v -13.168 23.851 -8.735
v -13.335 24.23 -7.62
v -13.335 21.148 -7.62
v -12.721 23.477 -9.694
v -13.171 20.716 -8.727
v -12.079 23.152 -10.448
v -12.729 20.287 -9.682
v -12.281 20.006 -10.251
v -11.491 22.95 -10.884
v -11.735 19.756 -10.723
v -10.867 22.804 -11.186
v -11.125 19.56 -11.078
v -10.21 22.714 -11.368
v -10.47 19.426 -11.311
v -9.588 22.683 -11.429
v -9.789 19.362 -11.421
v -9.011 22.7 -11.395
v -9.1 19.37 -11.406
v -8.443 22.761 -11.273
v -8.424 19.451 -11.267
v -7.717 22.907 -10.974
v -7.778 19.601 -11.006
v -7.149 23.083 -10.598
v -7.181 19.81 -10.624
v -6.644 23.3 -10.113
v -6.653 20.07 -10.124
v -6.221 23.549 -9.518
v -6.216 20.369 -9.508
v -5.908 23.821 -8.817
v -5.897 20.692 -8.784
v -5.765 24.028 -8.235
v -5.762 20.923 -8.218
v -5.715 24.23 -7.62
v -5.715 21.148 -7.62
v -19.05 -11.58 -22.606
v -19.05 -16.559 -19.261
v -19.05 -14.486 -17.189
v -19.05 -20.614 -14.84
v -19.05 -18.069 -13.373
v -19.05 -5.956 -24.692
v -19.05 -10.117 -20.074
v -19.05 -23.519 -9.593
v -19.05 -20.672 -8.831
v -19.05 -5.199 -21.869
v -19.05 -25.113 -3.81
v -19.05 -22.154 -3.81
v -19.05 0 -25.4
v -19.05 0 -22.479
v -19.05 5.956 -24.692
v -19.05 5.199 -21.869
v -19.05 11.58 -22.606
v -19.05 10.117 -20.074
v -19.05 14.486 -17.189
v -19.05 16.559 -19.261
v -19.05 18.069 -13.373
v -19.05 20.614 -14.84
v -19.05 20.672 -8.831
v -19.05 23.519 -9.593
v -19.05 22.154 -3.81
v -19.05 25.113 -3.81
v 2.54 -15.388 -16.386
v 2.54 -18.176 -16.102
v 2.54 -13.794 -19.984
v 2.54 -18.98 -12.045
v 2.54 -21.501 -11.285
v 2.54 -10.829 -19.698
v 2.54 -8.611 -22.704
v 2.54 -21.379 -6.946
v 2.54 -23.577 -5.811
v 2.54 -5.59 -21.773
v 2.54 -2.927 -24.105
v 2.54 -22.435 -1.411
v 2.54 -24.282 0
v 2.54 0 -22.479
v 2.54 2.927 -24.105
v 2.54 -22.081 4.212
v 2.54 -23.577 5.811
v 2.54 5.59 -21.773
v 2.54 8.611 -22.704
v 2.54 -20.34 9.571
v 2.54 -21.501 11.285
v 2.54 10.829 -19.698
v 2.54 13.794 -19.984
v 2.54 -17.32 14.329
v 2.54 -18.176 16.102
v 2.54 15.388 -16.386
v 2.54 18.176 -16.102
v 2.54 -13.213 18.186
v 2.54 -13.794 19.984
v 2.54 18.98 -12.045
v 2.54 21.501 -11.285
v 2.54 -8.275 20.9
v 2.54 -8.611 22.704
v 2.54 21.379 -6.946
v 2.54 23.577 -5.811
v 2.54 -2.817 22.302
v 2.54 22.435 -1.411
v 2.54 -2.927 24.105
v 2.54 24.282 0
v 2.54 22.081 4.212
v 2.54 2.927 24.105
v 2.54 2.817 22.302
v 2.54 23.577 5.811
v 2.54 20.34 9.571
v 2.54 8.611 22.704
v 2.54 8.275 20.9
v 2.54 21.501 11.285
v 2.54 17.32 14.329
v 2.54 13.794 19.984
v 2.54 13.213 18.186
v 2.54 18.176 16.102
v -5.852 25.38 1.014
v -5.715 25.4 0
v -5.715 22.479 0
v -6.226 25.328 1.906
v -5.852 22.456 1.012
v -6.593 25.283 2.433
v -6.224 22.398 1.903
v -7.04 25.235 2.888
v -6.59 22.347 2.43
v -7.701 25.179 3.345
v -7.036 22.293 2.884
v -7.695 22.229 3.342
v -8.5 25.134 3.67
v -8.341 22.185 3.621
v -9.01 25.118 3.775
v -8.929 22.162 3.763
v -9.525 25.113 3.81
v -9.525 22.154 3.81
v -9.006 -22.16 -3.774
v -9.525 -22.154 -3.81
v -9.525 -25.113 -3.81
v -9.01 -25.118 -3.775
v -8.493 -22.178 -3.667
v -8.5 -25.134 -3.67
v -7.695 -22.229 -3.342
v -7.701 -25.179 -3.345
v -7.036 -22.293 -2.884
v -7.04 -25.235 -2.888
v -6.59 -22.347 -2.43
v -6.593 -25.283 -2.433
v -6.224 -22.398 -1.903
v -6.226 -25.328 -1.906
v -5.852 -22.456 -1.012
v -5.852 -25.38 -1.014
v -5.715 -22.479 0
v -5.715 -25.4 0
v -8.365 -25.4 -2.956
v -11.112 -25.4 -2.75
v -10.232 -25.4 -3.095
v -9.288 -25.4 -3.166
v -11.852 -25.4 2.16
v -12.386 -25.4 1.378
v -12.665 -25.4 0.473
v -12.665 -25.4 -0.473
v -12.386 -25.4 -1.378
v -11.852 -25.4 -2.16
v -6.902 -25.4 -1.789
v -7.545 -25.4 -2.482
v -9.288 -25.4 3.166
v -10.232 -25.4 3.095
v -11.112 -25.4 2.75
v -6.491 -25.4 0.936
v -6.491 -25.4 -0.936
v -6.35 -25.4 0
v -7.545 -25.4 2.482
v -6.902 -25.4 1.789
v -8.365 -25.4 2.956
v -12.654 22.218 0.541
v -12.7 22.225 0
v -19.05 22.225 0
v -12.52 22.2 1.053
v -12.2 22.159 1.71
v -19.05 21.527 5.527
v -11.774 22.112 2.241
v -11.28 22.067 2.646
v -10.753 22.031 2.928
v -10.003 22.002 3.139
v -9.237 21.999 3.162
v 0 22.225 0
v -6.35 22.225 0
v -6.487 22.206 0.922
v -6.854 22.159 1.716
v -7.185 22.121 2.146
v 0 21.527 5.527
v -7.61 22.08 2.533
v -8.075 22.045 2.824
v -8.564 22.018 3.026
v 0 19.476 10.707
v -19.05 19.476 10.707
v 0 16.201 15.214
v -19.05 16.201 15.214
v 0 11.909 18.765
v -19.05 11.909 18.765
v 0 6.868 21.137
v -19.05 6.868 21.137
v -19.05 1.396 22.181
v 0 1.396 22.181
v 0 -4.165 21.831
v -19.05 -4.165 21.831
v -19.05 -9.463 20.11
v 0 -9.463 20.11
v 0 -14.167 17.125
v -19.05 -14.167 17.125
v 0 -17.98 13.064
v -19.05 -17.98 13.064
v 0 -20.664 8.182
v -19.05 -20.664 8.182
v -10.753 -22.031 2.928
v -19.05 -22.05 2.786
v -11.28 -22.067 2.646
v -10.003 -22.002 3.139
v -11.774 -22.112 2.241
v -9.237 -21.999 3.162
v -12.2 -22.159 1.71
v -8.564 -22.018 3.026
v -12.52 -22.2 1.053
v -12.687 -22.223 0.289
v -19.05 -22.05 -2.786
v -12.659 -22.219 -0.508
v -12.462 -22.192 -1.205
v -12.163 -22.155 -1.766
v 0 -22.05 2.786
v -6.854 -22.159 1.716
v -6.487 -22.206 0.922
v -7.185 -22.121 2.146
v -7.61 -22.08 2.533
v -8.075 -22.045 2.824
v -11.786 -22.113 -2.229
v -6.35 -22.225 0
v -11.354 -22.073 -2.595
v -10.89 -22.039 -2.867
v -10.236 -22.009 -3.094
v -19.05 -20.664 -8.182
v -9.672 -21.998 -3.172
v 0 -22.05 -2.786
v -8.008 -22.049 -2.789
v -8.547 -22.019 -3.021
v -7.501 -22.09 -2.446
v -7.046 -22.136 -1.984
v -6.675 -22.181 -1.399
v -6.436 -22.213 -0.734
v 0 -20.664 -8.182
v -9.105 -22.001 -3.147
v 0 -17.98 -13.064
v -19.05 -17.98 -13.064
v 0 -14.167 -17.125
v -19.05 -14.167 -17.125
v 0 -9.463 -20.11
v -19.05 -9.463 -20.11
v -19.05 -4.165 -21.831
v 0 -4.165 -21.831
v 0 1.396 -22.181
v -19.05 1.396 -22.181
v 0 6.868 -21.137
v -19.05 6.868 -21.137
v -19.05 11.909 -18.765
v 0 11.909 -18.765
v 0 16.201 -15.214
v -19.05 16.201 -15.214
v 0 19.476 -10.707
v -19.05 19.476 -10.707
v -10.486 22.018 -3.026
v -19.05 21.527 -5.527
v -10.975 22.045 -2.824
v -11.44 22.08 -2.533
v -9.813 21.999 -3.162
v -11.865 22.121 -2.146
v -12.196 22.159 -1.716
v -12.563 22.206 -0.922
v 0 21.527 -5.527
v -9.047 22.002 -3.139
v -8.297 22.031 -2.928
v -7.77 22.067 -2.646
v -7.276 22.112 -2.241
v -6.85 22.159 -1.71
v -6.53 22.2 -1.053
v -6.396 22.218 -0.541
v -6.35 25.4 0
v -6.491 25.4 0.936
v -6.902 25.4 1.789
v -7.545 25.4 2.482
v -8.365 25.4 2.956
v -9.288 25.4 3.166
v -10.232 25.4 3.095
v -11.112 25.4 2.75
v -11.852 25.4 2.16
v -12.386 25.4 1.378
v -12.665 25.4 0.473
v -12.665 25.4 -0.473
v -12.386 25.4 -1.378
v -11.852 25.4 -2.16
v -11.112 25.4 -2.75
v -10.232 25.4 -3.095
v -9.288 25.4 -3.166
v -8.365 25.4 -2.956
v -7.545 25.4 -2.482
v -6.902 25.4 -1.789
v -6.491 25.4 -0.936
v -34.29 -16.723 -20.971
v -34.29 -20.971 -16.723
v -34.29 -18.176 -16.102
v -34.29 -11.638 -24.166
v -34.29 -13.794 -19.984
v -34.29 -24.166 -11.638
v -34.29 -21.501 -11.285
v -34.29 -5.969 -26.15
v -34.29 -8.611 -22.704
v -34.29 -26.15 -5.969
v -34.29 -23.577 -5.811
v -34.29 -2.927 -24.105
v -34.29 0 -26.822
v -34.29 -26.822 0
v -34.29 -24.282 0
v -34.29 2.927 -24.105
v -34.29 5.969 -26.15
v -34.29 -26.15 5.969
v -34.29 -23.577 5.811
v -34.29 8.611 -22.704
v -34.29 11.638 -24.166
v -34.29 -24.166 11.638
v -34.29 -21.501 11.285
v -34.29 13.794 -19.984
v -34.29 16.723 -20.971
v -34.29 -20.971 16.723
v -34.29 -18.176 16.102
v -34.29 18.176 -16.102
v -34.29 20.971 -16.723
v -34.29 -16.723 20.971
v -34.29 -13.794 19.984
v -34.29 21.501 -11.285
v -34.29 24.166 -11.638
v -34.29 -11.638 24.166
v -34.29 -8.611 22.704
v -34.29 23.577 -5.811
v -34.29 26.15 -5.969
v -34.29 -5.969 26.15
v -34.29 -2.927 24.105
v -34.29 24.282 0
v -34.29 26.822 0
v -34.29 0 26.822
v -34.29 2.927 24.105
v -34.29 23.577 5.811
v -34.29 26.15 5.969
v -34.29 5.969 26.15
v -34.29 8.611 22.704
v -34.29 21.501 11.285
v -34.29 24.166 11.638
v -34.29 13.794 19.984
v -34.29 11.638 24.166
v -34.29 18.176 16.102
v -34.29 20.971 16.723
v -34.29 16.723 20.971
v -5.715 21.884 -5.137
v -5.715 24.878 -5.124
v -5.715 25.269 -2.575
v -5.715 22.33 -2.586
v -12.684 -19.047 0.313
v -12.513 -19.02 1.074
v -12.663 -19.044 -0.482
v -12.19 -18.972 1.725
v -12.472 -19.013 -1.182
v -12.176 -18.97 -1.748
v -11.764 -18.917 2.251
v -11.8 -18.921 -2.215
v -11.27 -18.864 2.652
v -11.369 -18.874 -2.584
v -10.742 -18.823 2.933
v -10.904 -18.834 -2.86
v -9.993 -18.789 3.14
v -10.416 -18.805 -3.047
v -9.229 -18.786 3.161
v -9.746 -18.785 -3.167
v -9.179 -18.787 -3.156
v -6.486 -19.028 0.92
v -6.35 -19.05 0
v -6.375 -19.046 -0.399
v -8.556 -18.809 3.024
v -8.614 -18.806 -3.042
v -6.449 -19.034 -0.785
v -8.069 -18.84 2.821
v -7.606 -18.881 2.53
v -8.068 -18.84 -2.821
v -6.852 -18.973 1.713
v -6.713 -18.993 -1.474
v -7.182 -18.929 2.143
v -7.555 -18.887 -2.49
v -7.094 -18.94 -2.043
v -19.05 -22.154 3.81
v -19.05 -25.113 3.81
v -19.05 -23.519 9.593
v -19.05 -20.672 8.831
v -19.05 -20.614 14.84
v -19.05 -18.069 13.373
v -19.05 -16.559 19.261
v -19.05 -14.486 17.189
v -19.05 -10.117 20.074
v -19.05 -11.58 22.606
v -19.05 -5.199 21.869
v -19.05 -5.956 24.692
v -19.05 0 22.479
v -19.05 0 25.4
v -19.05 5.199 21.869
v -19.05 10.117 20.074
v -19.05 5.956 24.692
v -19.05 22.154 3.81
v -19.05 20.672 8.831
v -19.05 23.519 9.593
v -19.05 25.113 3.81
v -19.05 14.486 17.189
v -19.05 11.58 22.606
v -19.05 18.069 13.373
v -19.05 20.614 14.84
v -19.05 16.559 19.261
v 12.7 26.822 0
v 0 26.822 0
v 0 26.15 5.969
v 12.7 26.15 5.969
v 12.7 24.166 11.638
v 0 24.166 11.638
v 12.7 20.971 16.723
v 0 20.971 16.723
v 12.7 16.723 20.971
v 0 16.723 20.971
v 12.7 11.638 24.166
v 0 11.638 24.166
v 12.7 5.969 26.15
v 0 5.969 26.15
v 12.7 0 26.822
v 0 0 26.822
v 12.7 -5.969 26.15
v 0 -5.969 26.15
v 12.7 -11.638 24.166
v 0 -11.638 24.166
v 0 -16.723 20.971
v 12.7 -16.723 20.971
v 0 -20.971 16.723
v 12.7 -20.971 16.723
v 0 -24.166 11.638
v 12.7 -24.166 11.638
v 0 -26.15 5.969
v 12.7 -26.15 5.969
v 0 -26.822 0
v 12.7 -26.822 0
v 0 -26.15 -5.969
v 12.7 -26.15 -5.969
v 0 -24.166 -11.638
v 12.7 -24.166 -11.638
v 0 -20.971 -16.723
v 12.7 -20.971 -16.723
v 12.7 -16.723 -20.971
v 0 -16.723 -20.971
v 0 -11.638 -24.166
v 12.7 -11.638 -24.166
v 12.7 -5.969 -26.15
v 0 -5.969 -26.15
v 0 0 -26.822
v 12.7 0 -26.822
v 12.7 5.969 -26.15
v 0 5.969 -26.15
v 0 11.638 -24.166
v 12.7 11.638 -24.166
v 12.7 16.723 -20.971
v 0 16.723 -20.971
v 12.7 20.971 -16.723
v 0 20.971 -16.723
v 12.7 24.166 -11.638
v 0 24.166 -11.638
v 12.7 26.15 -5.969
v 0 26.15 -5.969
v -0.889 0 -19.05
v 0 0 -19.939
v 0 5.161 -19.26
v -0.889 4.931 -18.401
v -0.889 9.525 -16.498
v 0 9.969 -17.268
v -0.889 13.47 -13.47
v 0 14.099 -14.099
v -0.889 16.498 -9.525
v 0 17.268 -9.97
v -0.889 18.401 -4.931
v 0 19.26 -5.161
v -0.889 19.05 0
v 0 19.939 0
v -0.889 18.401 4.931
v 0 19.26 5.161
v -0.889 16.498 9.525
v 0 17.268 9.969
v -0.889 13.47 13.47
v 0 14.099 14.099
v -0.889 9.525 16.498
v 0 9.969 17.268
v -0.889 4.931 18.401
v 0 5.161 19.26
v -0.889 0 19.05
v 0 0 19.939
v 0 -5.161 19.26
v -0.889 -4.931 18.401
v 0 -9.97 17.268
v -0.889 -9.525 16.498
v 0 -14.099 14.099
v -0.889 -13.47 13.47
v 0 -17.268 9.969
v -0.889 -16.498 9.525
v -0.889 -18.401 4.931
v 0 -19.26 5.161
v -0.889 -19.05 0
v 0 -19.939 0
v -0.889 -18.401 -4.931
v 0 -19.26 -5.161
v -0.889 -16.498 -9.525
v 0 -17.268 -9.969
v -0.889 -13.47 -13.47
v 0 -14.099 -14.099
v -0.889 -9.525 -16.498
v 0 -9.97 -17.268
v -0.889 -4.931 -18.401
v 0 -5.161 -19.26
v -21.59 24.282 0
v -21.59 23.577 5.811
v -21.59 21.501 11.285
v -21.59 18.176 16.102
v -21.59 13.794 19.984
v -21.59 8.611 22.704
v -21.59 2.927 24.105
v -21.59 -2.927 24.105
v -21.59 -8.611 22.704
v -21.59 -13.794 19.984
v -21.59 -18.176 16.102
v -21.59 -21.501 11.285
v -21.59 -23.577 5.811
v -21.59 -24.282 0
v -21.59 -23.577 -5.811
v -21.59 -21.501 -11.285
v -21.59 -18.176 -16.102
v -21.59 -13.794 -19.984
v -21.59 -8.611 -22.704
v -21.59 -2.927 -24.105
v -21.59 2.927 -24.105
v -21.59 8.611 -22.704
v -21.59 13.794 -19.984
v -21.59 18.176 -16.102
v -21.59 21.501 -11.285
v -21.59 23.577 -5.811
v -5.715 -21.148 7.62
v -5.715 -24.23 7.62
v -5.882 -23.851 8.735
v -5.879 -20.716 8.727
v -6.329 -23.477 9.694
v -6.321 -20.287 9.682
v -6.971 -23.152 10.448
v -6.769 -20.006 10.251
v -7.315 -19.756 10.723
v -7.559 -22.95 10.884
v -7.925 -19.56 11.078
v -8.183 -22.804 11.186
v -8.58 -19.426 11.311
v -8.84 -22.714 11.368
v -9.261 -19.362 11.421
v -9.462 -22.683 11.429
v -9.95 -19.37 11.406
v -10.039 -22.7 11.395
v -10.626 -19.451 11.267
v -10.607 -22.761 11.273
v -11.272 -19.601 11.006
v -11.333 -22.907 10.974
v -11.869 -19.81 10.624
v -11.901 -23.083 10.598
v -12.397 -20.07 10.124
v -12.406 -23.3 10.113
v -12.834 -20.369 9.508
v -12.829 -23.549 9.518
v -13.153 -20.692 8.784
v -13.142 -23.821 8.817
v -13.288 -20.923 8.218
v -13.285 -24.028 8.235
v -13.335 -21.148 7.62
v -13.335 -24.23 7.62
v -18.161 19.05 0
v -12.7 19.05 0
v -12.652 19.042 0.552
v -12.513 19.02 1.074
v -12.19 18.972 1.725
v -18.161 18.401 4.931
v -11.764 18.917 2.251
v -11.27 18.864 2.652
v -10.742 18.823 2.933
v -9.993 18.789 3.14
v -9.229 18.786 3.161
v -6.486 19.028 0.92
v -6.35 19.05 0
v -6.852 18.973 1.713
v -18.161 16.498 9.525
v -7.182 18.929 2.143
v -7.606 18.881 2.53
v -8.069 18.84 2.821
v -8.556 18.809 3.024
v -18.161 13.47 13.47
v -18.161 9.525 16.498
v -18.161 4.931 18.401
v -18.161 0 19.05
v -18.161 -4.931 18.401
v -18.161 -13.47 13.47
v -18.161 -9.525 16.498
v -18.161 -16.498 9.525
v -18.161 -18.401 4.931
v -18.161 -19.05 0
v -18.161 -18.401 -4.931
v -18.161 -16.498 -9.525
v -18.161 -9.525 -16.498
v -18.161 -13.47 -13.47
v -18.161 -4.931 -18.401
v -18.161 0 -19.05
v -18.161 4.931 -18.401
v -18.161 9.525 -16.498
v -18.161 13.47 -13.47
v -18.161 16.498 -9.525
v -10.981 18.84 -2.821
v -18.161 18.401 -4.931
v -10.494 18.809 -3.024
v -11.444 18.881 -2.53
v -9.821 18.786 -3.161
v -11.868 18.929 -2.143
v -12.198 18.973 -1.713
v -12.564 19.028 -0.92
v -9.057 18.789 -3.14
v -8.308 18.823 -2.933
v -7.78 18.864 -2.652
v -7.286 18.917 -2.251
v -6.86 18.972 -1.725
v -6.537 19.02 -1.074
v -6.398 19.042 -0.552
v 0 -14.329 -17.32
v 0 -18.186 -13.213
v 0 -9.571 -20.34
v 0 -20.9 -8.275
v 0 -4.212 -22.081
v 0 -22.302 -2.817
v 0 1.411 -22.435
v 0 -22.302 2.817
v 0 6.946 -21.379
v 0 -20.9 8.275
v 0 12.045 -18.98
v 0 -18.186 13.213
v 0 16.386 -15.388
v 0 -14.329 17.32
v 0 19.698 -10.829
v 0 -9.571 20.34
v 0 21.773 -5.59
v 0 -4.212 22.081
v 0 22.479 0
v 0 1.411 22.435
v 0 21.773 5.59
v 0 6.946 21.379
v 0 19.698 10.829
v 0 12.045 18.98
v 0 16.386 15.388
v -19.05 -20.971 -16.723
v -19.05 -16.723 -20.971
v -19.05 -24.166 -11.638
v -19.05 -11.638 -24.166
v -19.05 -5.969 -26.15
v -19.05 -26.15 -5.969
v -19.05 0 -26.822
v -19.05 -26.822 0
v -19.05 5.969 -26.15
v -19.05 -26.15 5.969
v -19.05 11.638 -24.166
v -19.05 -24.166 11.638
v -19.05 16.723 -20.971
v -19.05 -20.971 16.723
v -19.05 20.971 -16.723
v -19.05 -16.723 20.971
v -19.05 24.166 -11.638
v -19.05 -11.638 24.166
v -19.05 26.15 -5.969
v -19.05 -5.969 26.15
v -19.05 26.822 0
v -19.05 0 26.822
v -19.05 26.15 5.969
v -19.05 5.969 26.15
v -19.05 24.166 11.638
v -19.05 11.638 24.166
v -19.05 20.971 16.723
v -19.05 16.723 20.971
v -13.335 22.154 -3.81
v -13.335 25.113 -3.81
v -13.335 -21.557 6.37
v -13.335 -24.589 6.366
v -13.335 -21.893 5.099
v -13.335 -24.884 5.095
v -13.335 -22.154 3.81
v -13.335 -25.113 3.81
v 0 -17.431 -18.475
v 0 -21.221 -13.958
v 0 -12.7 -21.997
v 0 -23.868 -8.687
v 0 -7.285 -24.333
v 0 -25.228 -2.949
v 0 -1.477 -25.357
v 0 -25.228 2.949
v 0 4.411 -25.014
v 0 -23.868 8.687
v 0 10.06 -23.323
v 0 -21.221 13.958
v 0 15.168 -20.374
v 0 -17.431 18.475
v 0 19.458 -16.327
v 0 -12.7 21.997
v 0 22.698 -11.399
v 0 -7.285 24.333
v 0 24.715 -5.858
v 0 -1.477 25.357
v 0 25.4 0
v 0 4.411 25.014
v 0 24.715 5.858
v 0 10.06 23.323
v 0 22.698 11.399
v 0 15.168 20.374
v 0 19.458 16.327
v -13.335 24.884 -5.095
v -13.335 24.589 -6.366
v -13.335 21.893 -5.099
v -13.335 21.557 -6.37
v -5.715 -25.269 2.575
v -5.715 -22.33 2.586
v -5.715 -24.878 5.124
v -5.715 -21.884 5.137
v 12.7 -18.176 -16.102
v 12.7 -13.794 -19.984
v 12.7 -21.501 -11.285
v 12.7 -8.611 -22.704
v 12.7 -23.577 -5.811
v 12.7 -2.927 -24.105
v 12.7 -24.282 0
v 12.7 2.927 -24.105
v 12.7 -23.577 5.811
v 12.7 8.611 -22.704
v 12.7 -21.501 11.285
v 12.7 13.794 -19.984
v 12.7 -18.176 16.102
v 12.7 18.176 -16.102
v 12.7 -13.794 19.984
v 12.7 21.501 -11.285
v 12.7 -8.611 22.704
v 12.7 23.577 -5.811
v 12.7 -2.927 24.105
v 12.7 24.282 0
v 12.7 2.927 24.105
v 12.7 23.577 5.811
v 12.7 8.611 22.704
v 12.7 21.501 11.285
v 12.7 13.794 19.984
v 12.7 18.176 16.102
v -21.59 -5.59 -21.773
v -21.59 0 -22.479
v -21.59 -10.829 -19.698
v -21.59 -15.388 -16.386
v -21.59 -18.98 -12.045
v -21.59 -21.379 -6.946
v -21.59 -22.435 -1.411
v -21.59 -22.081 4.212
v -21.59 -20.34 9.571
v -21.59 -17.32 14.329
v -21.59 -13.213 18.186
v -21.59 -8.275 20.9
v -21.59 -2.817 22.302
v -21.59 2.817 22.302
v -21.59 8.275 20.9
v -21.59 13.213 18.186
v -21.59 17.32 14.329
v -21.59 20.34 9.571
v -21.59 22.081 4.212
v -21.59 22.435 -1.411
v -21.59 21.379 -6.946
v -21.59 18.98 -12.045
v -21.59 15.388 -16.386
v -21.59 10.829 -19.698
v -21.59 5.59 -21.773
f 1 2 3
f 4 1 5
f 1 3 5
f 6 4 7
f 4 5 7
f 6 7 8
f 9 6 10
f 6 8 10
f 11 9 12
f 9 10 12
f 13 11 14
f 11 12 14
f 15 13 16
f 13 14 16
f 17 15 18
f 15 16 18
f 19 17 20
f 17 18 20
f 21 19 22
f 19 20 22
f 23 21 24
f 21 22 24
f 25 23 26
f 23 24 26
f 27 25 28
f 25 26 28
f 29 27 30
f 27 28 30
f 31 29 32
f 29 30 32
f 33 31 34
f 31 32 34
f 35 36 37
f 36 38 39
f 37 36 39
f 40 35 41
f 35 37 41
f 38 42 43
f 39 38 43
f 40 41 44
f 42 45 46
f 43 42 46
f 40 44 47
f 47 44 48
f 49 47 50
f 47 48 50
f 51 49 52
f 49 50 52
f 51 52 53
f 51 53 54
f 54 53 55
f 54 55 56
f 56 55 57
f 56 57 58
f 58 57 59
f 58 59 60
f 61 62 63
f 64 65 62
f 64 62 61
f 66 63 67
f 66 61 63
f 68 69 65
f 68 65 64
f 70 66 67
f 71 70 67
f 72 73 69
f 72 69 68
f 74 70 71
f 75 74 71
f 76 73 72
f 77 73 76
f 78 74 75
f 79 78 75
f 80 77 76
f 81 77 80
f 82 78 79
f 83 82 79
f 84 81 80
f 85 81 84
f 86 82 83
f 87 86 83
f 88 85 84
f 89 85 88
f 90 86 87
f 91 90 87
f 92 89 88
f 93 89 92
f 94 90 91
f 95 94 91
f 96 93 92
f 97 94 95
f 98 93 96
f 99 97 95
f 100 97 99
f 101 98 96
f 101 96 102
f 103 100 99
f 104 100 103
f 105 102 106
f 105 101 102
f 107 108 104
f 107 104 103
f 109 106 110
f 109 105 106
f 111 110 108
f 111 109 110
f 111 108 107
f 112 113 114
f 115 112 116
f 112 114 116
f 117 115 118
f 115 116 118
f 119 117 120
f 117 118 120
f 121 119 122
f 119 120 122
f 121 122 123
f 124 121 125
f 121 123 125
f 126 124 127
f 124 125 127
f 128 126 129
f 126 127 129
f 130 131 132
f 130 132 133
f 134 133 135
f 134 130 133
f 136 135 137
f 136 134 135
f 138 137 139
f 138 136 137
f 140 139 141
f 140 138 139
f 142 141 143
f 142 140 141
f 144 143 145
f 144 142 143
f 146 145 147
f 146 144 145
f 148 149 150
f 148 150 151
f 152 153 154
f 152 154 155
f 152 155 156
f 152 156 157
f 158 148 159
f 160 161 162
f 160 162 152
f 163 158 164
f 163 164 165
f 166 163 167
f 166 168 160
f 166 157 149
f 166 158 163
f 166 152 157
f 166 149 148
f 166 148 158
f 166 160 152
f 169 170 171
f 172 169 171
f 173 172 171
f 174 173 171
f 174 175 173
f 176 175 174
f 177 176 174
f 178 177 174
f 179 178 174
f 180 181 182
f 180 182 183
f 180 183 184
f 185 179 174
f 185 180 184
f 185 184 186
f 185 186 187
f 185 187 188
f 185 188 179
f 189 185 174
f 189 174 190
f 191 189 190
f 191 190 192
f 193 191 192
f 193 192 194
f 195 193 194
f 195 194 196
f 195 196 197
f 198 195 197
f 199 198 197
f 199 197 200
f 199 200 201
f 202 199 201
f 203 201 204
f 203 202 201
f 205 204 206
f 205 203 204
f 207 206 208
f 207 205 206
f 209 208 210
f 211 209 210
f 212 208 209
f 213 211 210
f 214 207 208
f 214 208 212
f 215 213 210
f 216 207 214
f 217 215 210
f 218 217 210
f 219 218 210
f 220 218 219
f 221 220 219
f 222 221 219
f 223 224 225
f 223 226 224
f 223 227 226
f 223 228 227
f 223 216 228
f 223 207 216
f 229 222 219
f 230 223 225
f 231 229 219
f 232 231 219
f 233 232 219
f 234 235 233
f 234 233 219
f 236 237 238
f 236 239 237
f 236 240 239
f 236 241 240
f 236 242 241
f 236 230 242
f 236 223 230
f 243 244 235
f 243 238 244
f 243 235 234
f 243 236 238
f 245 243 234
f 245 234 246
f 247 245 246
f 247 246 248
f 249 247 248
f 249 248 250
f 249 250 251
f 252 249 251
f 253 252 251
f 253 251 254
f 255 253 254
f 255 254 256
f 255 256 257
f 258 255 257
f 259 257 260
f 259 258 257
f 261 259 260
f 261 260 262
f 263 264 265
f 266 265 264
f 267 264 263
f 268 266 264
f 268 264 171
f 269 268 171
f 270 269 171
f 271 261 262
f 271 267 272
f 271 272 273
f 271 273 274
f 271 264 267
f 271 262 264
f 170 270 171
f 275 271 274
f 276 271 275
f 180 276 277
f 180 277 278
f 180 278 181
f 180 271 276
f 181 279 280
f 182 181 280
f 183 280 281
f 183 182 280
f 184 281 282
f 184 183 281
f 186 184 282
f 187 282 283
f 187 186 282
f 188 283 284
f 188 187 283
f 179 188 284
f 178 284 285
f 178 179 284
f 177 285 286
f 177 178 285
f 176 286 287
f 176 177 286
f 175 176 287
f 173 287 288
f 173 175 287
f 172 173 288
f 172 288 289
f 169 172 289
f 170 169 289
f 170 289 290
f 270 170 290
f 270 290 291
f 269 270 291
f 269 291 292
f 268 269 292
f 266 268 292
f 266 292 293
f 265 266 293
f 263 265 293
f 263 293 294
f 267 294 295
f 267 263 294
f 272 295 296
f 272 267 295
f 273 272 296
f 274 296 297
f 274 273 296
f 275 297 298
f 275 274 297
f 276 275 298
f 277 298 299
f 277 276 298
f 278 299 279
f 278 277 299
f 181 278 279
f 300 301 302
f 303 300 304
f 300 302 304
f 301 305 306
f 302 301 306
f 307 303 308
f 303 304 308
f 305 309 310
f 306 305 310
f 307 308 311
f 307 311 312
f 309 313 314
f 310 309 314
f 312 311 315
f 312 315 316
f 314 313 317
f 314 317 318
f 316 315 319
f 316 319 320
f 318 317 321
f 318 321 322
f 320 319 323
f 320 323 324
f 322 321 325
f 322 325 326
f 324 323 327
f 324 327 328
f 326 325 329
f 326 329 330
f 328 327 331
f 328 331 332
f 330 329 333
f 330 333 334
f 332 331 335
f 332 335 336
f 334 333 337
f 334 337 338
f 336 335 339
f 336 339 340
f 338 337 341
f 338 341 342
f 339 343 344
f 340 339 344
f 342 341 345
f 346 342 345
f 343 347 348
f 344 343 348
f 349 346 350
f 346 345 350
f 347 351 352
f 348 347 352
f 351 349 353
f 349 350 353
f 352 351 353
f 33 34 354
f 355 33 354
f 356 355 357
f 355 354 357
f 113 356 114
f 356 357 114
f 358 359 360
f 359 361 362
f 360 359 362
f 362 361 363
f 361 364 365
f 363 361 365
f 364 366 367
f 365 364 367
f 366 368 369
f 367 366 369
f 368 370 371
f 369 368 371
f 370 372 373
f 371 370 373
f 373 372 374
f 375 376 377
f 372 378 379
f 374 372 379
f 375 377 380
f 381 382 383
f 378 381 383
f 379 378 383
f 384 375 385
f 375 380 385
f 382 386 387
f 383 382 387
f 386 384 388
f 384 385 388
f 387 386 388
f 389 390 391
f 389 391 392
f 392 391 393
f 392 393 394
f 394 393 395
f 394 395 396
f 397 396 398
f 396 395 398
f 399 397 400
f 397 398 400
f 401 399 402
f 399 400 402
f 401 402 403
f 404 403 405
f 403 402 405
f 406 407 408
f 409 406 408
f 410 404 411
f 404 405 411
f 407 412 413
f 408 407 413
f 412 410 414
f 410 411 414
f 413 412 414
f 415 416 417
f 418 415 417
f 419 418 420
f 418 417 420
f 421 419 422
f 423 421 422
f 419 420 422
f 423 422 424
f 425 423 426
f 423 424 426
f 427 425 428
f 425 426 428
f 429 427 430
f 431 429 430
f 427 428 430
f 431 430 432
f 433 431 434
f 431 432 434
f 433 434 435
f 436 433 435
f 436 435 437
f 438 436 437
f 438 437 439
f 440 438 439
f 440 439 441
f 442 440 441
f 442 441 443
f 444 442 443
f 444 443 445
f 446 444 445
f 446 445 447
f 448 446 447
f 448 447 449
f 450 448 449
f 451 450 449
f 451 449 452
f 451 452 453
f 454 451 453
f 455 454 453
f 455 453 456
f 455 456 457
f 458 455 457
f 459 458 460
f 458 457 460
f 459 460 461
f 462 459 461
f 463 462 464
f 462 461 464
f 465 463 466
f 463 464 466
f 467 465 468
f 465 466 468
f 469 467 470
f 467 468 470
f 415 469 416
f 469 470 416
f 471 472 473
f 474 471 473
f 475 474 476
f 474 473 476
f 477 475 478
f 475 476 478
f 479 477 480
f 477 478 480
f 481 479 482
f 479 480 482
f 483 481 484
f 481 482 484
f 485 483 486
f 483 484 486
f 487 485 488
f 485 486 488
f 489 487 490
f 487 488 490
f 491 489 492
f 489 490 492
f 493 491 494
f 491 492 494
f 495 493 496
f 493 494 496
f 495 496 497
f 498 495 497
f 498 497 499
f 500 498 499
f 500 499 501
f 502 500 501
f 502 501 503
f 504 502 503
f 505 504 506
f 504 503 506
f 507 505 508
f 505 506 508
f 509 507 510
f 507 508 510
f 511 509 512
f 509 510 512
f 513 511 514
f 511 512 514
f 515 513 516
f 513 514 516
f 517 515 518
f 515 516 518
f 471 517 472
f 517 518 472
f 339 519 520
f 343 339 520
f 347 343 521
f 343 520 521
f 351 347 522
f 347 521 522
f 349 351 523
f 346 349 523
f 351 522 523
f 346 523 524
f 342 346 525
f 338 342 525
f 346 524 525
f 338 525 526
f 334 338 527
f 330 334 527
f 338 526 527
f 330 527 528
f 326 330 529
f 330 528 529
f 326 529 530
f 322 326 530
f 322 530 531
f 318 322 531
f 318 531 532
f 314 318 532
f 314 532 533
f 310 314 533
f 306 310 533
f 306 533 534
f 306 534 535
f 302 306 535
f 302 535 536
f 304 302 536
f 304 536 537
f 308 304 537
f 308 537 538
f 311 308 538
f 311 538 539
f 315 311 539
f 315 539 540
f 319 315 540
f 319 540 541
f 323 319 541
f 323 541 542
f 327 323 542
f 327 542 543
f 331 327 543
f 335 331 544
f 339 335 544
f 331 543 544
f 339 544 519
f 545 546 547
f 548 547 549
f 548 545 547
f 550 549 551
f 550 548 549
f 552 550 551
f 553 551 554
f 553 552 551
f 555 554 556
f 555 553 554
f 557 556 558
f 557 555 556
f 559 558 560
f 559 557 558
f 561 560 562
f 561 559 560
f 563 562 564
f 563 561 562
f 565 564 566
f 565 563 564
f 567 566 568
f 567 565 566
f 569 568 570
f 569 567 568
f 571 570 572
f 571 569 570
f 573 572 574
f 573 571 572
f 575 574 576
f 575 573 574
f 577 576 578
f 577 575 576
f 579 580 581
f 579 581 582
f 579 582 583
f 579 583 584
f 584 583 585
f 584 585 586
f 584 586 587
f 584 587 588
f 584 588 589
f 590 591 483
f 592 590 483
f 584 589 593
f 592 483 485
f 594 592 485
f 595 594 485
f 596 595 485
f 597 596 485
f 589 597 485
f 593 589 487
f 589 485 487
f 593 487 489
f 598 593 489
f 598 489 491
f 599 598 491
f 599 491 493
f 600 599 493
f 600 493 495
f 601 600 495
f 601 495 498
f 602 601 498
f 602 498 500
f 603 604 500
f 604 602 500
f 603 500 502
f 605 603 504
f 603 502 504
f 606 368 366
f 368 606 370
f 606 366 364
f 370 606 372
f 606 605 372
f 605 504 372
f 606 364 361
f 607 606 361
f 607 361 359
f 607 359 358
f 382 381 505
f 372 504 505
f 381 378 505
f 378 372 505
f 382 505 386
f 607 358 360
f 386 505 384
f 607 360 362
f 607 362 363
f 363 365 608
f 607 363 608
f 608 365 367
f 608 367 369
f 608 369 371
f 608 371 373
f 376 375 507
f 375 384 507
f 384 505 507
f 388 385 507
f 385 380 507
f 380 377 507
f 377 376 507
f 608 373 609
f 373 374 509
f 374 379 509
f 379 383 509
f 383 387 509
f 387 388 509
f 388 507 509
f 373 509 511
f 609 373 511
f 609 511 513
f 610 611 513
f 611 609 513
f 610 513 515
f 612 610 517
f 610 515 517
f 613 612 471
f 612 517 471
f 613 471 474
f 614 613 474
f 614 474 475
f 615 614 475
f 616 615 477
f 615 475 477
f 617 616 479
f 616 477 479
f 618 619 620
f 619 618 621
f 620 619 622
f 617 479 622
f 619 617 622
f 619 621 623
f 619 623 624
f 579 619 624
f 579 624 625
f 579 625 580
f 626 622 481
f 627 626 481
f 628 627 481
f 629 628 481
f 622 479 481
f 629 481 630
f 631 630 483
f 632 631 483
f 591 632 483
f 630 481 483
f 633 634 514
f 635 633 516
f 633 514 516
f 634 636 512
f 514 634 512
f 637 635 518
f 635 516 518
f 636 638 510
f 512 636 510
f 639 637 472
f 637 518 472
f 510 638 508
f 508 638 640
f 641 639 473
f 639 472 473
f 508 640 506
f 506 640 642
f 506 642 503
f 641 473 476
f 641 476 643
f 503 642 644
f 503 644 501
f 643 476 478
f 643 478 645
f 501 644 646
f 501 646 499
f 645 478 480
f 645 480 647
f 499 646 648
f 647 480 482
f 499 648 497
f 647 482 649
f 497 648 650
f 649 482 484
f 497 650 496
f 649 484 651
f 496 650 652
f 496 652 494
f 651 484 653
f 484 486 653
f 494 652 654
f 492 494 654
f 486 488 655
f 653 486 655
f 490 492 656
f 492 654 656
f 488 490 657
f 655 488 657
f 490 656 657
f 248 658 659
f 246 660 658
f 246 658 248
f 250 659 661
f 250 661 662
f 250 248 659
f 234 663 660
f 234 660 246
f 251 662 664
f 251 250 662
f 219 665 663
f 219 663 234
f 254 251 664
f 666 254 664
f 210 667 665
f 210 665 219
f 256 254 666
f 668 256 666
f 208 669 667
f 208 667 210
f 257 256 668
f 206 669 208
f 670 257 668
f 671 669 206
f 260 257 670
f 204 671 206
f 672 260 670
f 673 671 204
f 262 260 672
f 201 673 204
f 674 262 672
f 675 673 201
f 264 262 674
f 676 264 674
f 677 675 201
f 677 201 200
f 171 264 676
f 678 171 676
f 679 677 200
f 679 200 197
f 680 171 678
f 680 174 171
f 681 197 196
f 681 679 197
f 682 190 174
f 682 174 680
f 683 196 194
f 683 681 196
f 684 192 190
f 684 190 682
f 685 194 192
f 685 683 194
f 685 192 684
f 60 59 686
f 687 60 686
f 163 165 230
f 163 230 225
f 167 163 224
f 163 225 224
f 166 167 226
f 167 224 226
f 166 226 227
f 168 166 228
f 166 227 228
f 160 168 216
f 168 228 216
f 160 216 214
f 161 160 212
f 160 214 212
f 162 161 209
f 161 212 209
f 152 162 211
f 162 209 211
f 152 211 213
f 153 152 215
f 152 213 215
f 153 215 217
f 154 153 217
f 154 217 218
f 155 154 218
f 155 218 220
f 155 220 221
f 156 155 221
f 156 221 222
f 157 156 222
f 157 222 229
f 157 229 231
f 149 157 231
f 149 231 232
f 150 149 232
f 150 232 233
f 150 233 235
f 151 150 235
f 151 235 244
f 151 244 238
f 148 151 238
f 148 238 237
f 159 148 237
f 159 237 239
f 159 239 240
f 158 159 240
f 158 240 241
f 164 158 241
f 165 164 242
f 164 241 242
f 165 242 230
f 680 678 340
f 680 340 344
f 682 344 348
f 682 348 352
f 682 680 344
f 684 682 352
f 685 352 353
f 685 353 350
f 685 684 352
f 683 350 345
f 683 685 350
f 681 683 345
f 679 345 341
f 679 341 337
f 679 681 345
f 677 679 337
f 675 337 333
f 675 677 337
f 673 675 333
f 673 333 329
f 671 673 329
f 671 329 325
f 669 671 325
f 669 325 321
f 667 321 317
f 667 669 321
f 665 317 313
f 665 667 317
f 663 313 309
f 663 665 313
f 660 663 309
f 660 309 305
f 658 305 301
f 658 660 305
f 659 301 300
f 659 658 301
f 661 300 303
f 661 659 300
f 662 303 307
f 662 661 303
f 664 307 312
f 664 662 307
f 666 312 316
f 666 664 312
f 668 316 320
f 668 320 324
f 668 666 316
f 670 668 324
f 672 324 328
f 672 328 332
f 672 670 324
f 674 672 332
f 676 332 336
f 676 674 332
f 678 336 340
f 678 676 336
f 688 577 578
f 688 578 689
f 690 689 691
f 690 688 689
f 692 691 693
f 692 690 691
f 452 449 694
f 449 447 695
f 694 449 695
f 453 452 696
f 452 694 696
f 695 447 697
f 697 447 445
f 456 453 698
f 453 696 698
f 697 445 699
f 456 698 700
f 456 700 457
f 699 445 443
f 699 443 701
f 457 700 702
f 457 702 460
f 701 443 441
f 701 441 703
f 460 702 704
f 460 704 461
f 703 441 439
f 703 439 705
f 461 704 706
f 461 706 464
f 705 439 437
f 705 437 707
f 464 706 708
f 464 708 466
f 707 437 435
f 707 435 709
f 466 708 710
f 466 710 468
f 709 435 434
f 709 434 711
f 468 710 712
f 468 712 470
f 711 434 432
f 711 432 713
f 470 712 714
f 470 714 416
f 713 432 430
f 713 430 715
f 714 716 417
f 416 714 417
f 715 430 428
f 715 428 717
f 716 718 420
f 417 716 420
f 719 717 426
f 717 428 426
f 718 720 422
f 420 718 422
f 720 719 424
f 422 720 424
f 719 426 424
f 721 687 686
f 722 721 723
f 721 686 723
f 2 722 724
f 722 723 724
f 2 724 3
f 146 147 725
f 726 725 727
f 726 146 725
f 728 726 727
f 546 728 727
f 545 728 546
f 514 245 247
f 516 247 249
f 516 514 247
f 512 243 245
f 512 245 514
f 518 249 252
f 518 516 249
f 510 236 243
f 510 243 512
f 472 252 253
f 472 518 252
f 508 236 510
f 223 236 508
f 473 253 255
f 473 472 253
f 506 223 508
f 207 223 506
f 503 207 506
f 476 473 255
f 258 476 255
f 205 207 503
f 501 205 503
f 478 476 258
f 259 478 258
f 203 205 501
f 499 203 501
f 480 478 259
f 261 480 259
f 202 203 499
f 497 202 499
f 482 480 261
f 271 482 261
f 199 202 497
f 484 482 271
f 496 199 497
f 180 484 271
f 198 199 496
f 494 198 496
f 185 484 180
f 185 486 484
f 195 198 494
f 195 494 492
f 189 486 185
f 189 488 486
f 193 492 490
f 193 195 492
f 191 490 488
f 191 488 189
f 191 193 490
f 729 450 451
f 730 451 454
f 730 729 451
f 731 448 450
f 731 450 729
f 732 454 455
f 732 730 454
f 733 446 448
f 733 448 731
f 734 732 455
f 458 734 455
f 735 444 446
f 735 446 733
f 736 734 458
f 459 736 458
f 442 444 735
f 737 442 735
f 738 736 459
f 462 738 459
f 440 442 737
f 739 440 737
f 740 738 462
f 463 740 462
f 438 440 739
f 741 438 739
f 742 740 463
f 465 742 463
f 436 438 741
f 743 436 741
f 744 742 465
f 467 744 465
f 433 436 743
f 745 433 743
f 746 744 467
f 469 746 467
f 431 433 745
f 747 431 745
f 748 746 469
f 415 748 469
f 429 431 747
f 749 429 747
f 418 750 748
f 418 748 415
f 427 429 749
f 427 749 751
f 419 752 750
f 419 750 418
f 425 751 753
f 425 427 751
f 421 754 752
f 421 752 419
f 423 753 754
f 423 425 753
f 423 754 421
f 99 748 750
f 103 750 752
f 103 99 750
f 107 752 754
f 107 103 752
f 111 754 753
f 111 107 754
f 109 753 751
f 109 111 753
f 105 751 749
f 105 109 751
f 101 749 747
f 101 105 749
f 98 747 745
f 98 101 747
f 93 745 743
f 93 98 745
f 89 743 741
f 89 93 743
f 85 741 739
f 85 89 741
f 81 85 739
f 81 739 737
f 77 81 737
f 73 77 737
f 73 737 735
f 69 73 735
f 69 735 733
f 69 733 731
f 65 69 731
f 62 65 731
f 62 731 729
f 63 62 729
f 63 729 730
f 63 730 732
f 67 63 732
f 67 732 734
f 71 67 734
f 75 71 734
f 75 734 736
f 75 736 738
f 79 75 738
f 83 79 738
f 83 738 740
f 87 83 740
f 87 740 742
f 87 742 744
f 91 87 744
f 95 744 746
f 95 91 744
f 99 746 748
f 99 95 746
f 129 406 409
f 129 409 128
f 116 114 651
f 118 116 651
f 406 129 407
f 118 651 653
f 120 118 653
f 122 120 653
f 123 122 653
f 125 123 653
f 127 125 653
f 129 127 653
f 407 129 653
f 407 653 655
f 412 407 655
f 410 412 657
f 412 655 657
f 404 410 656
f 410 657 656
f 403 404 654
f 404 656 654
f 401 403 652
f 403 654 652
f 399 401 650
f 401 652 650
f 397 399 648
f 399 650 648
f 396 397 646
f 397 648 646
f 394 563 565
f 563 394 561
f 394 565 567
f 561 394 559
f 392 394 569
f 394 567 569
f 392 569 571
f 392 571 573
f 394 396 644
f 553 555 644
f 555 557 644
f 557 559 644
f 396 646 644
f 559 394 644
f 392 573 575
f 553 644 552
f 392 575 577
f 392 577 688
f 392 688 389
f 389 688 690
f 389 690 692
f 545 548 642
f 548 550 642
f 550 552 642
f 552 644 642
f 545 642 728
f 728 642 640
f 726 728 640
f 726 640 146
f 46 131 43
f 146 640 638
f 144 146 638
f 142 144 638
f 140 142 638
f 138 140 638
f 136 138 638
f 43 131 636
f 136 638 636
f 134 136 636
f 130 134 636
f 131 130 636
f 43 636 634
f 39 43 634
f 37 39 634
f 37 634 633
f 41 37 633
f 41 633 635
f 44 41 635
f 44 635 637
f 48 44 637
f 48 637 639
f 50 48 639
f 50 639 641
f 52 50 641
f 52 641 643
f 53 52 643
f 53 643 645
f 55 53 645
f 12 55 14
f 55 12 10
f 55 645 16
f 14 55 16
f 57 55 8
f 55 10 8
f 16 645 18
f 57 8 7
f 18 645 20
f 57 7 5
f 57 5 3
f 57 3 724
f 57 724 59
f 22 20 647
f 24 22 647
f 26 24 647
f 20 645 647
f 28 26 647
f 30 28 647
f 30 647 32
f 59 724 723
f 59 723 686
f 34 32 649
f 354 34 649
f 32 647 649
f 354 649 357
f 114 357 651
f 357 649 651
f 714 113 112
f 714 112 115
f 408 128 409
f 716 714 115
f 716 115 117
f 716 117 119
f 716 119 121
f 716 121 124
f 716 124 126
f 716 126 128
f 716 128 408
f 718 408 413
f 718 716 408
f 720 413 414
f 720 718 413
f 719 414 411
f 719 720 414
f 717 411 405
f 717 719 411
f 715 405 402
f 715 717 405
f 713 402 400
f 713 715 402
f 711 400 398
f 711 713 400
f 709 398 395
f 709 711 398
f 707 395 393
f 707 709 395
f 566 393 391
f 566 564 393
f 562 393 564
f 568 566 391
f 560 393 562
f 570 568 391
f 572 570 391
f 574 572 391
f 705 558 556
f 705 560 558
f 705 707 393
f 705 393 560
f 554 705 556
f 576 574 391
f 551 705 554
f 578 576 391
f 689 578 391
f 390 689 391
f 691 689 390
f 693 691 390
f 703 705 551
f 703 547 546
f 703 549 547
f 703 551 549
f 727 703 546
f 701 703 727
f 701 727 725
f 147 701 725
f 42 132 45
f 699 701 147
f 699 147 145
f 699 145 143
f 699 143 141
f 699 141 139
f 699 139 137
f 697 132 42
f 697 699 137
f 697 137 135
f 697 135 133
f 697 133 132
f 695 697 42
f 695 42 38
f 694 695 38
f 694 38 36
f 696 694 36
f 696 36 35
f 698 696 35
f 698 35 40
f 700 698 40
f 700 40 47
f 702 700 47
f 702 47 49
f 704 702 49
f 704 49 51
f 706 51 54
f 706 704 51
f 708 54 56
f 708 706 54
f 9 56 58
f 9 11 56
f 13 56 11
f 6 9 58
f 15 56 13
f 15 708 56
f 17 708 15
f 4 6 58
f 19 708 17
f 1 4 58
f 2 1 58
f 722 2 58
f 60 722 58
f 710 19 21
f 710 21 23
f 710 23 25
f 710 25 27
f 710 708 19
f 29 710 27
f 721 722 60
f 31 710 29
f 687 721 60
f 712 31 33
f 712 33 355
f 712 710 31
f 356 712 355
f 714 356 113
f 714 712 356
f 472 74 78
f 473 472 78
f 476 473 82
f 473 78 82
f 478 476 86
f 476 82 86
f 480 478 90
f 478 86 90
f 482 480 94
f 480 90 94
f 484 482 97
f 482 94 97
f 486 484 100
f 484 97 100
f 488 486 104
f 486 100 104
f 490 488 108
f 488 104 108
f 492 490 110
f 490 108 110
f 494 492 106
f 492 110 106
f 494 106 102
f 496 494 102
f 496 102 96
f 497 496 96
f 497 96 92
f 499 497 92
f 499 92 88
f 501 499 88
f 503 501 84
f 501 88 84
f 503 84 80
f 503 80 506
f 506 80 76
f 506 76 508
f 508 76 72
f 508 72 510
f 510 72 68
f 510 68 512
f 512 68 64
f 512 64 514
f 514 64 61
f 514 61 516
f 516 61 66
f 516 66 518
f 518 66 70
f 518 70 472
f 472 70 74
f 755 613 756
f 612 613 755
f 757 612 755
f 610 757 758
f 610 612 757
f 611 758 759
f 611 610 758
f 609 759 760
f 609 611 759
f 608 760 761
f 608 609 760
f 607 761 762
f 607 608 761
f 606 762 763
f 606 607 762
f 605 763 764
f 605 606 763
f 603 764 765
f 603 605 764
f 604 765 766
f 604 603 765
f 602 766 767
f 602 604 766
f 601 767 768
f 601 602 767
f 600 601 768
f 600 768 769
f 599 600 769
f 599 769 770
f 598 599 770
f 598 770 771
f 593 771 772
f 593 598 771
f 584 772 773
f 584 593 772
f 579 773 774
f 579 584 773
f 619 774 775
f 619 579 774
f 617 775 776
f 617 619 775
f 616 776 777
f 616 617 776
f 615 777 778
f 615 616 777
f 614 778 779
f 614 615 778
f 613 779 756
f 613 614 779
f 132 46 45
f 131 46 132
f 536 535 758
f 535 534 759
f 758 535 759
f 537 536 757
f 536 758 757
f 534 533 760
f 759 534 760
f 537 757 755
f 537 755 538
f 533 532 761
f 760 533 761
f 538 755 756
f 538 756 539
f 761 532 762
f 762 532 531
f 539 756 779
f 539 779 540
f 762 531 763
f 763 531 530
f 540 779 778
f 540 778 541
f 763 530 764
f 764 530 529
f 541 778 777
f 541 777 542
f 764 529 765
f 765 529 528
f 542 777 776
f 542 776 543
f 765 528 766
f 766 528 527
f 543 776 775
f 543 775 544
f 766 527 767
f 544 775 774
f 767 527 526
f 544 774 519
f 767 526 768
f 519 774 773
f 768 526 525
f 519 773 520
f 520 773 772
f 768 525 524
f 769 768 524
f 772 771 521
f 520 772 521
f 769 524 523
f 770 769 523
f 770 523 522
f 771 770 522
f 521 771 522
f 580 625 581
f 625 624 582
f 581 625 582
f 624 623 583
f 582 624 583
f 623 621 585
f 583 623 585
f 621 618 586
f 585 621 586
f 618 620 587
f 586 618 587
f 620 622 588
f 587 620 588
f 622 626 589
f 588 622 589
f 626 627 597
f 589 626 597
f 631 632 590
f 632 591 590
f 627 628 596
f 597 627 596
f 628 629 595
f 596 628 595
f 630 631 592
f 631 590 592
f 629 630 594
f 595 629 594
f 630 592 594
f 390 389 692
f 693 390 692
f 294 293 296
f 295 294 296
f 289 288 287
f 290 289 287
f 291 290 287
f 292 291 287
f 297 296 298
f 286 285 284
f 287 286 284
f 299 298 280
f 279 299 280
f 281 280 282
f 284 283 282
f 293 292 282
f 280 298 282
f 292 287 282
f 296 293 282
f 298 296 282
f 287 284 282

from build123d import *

# Parameters (mm, degrees)
F0_R           = 26.8224
F0_R_2         = 24.2824
F0_R_3         = 19.05
F1_DEPTH       = 2.54
F2_DEPTH       = 12.7
F3_R           = 25.4
F3_R_2         = 22.479
F4_DEPTH       = 19.05
F5_W           = 9.525
F5_H           = 7.62
F6_DEPTH       = 50.8
F6_DEPTH_BACK  = 50.8
F7_R           = 3.81
F8_DEPTH       = 50.8
F8_DEPTH_BACK  = 50.8
F10_DEPTH      = 50.8
F12_DEPTH      = 25.4
F13_R          = 22.225
F13_R_2        = 19.05
F14_DEPTH      = 21.59
F15_START      = -19.05
F13_R_3        = 24.2824
F15_DEPTH      = 2.54
F17_START      = -19.05
F16_R          = 26.8224
F16_R_2        = 24.2824
F17_DEPTH      = 15.24
F18_R          = 3.175
F19_DEPTH      = 25.4
F19_DEPTH_BACK = 25.4
F20_DEPTH      = 25.4
F21_W          = 2.54
F21_H          = 0.889


with BuildPart() as f1:
    # F0 (on Right) → F1 (new body)
    with BuildSketch(Plane.YZ):
        Circle(F0_R)
        Circle(F0_R_2, mode=Mode.SUBTRACT)
        Circle(F0_R_2)
        Circle(F0_R_3, mode=Mode.SUBTRACT)
    extrude(amount=F1_DEPTH)

    # F0 (on Right) → F2 (join)
    with BuildSketch(Plane.YZ):
        Circle(F0_R)
        Circle(F0_R_2, mode=Mode.SUBTRACT)
    extrude(amount=F2_DEPTH)

    # F3 (on Right) → F4 (join)
    with BuildSketch(Plane.YZ):
        Circle(F3_R)
        Circle(F3_R_2, mode=Mode.SUBTRACT)
    extrude(amount=-F4_DEPTH)

    # F5 (on Front) → F6 (cut, two sides)
    with BuildSketch(Plane.XZ) as f6_sk:
        with Locations((-14.2875, 0)):
            Rectangle(F5_W, F5_H)
    extrude(amount=-F6_DEPTH, mode=Mode.SUBTRACT)
    extrude(f6_sk.sketch, amount=F6_DEPTH_BACK, mode=Mode.SUBTRACT)

    # F7 (on Front) → F8 (cut, two sides)
    with BuildSketch(Plane.XZ) as f8_sk:
        with Locations((-9.525, 0)):
            Circle(F7_R)
    extrude(amount=-F8_DEPTH, mode=Mode.SUBTRACT)
    extrude(f8_sk.sketch, amount=F8_DEPTH_BACK, mode=Mode.SUBTRACT)

    # F9 (on Front) → F10 (cut)
    with BuildSketch(Plane.XZ):
        with BuildLine():
            ThreePointArc((-13.335, 7.62), (-9.525, 3.81), (-5.715, 7.62))
            ThreePointArc((-5.715, 7.62), (-9.525, 11.43), (-13.335, 7.62))
        make_face()
        with BuildLine():
            Line((-5.715, 0), (-5.715, 7.62))
            ThreePointArc((-5.715, 7.62), (-9.525, 3.81), (-13.335, 7.62))
            Line((-13.335, 7.62), (-13.335, 0))
            Line((-13.335, 0), (-5.715, 0))
        make_face()
    extrude(amount=F10_DEPTH, mode=Mode.SUBTRACT)

    # F11 (on Front) → F12 (cut)
    with BuildSketch(Plane.XZ):
        with BuildLine():
            ThreePointArc((-13.335, -7.62), (-9.525, -3.81), (-5.715, -7.62))
            Line((-5.715, -7.62), (-5.715, 0))
            Line((-5.715, 0), (-13.335, 0))
            Line((-13.335, 0), (-13.335, -7.62))
        make_face()
        with BuildLine():
            ThreePointArc((-13.335, -7.62), (-9.525, -11.43), (-5.715, -7.62))
            ThreePointArc((-5.715, -7.62), (-9.525, -3.81), (-13.335, -7.62))
        make_face()
    extrude(amount=-F12_DEPTH, mode=Mode.SUBTRACT)


with BuildPart() as f14:
    # F13 (on Right) → F14 (new body)
    with BuildSketch(Plane.YZ):
        Circle(F13_R)
        Circle(F13_R_2, mode=Mode.SUBTRACT)
    extrude(amount=-F14_DEPTH)

    # F13 (on Right) → F15 (join)
    with BuildSketch(Plane.YZ.offset(F15_START)):
        Circle(F13_R_3)
        Circle(F13_R, mode=Mode.SUBTRACT)
    extrude(amount=-F15_DEPTH)

    # F16 (on Right) → F17 (join)
    with BuildSketch(Plane.YZ.offset(F17_START)):
        Circle(F16_R)
        Circle(F16_R_2, mode=Mode.SUBTRACT)
    extrude(amount=-F17_DEPTH)

    # F18 (on Front) → F19 (join, two sides)
    with BuildSketch(Plane.XZ) as f19_sk:
        with Locations((-9.525, 0)):
            Circle(F18_R)
    extrude(amount=F19_DEPTH)
    extrude(f19_sk.sketch, amount=-F19_DEPTH_BACK)

    # F13 (on Right) → F20 (cut)
    with BuildSketch(Plane.YZ):
        Circle(F13_R_2)
    extrude(amount=-F20_DEPTH, mode=Mode.SUBTRACT)


with BuildPart() as f22_tool:
    # F21 (on Front) → F22 (revolve)
    with BuildSketch(Plane.XZ):
        Polygon((0, -19.939), (2.54, -22.479), (2.54, -19.939), align=None)
        with Locations((1.27, -19.4945)):
            Rectangle(F21_W, F21_H)
        Polygon((-0.889, -19.05), (0, -19.939), (0, -19.05), align=None)
    revolve(axis=Axis((12.2344479781, 0, 0), (1, 0, 0)))


with BuildPart() as f1_1:
    add(f1.part)

    # F22: cut by f22_tool
    add(f22_tool.part, mode=Mode.SUBTRACT)

    # F21 (on Front) → F25 (revolve, cut)
    with BuildSketch(Plane.XZ):
        Polygon((0, -19.939), (2.54, -22.479), (2.54, -19.939), align=None)
        with Locations((1.27, -19.4945)):
            Rectangle(F21_W, F21_H)
        Polygon((-0.889, -19.05), (0, -19.939), (0, -19.05), align=None)
    revolve(axis=Axis((12.2344479781, 0, 0), (1, 0, 0)), mode=Mode.SUBTRACT)


with BuildPart() as f14_1:
    add(f14.part)

    # F22: cut by f22_tool
    add(f22_tool.part, mode=Mode.SUBTRACT)

    # F23 (on Front) → F24 (revolve, cut)
    with BuildSketch(Plane.XZ):
        Polygon((-18.161, -19.05), (-21.59, -19.05), (-21.59, -22.479), align=None)
    revolve(axis=Axis((-10.795, 0, 0), (-1, 0, 0)), mode=Mode.SUBTRACT)


solid = Compound([f1_1.part, f14_1.part])
